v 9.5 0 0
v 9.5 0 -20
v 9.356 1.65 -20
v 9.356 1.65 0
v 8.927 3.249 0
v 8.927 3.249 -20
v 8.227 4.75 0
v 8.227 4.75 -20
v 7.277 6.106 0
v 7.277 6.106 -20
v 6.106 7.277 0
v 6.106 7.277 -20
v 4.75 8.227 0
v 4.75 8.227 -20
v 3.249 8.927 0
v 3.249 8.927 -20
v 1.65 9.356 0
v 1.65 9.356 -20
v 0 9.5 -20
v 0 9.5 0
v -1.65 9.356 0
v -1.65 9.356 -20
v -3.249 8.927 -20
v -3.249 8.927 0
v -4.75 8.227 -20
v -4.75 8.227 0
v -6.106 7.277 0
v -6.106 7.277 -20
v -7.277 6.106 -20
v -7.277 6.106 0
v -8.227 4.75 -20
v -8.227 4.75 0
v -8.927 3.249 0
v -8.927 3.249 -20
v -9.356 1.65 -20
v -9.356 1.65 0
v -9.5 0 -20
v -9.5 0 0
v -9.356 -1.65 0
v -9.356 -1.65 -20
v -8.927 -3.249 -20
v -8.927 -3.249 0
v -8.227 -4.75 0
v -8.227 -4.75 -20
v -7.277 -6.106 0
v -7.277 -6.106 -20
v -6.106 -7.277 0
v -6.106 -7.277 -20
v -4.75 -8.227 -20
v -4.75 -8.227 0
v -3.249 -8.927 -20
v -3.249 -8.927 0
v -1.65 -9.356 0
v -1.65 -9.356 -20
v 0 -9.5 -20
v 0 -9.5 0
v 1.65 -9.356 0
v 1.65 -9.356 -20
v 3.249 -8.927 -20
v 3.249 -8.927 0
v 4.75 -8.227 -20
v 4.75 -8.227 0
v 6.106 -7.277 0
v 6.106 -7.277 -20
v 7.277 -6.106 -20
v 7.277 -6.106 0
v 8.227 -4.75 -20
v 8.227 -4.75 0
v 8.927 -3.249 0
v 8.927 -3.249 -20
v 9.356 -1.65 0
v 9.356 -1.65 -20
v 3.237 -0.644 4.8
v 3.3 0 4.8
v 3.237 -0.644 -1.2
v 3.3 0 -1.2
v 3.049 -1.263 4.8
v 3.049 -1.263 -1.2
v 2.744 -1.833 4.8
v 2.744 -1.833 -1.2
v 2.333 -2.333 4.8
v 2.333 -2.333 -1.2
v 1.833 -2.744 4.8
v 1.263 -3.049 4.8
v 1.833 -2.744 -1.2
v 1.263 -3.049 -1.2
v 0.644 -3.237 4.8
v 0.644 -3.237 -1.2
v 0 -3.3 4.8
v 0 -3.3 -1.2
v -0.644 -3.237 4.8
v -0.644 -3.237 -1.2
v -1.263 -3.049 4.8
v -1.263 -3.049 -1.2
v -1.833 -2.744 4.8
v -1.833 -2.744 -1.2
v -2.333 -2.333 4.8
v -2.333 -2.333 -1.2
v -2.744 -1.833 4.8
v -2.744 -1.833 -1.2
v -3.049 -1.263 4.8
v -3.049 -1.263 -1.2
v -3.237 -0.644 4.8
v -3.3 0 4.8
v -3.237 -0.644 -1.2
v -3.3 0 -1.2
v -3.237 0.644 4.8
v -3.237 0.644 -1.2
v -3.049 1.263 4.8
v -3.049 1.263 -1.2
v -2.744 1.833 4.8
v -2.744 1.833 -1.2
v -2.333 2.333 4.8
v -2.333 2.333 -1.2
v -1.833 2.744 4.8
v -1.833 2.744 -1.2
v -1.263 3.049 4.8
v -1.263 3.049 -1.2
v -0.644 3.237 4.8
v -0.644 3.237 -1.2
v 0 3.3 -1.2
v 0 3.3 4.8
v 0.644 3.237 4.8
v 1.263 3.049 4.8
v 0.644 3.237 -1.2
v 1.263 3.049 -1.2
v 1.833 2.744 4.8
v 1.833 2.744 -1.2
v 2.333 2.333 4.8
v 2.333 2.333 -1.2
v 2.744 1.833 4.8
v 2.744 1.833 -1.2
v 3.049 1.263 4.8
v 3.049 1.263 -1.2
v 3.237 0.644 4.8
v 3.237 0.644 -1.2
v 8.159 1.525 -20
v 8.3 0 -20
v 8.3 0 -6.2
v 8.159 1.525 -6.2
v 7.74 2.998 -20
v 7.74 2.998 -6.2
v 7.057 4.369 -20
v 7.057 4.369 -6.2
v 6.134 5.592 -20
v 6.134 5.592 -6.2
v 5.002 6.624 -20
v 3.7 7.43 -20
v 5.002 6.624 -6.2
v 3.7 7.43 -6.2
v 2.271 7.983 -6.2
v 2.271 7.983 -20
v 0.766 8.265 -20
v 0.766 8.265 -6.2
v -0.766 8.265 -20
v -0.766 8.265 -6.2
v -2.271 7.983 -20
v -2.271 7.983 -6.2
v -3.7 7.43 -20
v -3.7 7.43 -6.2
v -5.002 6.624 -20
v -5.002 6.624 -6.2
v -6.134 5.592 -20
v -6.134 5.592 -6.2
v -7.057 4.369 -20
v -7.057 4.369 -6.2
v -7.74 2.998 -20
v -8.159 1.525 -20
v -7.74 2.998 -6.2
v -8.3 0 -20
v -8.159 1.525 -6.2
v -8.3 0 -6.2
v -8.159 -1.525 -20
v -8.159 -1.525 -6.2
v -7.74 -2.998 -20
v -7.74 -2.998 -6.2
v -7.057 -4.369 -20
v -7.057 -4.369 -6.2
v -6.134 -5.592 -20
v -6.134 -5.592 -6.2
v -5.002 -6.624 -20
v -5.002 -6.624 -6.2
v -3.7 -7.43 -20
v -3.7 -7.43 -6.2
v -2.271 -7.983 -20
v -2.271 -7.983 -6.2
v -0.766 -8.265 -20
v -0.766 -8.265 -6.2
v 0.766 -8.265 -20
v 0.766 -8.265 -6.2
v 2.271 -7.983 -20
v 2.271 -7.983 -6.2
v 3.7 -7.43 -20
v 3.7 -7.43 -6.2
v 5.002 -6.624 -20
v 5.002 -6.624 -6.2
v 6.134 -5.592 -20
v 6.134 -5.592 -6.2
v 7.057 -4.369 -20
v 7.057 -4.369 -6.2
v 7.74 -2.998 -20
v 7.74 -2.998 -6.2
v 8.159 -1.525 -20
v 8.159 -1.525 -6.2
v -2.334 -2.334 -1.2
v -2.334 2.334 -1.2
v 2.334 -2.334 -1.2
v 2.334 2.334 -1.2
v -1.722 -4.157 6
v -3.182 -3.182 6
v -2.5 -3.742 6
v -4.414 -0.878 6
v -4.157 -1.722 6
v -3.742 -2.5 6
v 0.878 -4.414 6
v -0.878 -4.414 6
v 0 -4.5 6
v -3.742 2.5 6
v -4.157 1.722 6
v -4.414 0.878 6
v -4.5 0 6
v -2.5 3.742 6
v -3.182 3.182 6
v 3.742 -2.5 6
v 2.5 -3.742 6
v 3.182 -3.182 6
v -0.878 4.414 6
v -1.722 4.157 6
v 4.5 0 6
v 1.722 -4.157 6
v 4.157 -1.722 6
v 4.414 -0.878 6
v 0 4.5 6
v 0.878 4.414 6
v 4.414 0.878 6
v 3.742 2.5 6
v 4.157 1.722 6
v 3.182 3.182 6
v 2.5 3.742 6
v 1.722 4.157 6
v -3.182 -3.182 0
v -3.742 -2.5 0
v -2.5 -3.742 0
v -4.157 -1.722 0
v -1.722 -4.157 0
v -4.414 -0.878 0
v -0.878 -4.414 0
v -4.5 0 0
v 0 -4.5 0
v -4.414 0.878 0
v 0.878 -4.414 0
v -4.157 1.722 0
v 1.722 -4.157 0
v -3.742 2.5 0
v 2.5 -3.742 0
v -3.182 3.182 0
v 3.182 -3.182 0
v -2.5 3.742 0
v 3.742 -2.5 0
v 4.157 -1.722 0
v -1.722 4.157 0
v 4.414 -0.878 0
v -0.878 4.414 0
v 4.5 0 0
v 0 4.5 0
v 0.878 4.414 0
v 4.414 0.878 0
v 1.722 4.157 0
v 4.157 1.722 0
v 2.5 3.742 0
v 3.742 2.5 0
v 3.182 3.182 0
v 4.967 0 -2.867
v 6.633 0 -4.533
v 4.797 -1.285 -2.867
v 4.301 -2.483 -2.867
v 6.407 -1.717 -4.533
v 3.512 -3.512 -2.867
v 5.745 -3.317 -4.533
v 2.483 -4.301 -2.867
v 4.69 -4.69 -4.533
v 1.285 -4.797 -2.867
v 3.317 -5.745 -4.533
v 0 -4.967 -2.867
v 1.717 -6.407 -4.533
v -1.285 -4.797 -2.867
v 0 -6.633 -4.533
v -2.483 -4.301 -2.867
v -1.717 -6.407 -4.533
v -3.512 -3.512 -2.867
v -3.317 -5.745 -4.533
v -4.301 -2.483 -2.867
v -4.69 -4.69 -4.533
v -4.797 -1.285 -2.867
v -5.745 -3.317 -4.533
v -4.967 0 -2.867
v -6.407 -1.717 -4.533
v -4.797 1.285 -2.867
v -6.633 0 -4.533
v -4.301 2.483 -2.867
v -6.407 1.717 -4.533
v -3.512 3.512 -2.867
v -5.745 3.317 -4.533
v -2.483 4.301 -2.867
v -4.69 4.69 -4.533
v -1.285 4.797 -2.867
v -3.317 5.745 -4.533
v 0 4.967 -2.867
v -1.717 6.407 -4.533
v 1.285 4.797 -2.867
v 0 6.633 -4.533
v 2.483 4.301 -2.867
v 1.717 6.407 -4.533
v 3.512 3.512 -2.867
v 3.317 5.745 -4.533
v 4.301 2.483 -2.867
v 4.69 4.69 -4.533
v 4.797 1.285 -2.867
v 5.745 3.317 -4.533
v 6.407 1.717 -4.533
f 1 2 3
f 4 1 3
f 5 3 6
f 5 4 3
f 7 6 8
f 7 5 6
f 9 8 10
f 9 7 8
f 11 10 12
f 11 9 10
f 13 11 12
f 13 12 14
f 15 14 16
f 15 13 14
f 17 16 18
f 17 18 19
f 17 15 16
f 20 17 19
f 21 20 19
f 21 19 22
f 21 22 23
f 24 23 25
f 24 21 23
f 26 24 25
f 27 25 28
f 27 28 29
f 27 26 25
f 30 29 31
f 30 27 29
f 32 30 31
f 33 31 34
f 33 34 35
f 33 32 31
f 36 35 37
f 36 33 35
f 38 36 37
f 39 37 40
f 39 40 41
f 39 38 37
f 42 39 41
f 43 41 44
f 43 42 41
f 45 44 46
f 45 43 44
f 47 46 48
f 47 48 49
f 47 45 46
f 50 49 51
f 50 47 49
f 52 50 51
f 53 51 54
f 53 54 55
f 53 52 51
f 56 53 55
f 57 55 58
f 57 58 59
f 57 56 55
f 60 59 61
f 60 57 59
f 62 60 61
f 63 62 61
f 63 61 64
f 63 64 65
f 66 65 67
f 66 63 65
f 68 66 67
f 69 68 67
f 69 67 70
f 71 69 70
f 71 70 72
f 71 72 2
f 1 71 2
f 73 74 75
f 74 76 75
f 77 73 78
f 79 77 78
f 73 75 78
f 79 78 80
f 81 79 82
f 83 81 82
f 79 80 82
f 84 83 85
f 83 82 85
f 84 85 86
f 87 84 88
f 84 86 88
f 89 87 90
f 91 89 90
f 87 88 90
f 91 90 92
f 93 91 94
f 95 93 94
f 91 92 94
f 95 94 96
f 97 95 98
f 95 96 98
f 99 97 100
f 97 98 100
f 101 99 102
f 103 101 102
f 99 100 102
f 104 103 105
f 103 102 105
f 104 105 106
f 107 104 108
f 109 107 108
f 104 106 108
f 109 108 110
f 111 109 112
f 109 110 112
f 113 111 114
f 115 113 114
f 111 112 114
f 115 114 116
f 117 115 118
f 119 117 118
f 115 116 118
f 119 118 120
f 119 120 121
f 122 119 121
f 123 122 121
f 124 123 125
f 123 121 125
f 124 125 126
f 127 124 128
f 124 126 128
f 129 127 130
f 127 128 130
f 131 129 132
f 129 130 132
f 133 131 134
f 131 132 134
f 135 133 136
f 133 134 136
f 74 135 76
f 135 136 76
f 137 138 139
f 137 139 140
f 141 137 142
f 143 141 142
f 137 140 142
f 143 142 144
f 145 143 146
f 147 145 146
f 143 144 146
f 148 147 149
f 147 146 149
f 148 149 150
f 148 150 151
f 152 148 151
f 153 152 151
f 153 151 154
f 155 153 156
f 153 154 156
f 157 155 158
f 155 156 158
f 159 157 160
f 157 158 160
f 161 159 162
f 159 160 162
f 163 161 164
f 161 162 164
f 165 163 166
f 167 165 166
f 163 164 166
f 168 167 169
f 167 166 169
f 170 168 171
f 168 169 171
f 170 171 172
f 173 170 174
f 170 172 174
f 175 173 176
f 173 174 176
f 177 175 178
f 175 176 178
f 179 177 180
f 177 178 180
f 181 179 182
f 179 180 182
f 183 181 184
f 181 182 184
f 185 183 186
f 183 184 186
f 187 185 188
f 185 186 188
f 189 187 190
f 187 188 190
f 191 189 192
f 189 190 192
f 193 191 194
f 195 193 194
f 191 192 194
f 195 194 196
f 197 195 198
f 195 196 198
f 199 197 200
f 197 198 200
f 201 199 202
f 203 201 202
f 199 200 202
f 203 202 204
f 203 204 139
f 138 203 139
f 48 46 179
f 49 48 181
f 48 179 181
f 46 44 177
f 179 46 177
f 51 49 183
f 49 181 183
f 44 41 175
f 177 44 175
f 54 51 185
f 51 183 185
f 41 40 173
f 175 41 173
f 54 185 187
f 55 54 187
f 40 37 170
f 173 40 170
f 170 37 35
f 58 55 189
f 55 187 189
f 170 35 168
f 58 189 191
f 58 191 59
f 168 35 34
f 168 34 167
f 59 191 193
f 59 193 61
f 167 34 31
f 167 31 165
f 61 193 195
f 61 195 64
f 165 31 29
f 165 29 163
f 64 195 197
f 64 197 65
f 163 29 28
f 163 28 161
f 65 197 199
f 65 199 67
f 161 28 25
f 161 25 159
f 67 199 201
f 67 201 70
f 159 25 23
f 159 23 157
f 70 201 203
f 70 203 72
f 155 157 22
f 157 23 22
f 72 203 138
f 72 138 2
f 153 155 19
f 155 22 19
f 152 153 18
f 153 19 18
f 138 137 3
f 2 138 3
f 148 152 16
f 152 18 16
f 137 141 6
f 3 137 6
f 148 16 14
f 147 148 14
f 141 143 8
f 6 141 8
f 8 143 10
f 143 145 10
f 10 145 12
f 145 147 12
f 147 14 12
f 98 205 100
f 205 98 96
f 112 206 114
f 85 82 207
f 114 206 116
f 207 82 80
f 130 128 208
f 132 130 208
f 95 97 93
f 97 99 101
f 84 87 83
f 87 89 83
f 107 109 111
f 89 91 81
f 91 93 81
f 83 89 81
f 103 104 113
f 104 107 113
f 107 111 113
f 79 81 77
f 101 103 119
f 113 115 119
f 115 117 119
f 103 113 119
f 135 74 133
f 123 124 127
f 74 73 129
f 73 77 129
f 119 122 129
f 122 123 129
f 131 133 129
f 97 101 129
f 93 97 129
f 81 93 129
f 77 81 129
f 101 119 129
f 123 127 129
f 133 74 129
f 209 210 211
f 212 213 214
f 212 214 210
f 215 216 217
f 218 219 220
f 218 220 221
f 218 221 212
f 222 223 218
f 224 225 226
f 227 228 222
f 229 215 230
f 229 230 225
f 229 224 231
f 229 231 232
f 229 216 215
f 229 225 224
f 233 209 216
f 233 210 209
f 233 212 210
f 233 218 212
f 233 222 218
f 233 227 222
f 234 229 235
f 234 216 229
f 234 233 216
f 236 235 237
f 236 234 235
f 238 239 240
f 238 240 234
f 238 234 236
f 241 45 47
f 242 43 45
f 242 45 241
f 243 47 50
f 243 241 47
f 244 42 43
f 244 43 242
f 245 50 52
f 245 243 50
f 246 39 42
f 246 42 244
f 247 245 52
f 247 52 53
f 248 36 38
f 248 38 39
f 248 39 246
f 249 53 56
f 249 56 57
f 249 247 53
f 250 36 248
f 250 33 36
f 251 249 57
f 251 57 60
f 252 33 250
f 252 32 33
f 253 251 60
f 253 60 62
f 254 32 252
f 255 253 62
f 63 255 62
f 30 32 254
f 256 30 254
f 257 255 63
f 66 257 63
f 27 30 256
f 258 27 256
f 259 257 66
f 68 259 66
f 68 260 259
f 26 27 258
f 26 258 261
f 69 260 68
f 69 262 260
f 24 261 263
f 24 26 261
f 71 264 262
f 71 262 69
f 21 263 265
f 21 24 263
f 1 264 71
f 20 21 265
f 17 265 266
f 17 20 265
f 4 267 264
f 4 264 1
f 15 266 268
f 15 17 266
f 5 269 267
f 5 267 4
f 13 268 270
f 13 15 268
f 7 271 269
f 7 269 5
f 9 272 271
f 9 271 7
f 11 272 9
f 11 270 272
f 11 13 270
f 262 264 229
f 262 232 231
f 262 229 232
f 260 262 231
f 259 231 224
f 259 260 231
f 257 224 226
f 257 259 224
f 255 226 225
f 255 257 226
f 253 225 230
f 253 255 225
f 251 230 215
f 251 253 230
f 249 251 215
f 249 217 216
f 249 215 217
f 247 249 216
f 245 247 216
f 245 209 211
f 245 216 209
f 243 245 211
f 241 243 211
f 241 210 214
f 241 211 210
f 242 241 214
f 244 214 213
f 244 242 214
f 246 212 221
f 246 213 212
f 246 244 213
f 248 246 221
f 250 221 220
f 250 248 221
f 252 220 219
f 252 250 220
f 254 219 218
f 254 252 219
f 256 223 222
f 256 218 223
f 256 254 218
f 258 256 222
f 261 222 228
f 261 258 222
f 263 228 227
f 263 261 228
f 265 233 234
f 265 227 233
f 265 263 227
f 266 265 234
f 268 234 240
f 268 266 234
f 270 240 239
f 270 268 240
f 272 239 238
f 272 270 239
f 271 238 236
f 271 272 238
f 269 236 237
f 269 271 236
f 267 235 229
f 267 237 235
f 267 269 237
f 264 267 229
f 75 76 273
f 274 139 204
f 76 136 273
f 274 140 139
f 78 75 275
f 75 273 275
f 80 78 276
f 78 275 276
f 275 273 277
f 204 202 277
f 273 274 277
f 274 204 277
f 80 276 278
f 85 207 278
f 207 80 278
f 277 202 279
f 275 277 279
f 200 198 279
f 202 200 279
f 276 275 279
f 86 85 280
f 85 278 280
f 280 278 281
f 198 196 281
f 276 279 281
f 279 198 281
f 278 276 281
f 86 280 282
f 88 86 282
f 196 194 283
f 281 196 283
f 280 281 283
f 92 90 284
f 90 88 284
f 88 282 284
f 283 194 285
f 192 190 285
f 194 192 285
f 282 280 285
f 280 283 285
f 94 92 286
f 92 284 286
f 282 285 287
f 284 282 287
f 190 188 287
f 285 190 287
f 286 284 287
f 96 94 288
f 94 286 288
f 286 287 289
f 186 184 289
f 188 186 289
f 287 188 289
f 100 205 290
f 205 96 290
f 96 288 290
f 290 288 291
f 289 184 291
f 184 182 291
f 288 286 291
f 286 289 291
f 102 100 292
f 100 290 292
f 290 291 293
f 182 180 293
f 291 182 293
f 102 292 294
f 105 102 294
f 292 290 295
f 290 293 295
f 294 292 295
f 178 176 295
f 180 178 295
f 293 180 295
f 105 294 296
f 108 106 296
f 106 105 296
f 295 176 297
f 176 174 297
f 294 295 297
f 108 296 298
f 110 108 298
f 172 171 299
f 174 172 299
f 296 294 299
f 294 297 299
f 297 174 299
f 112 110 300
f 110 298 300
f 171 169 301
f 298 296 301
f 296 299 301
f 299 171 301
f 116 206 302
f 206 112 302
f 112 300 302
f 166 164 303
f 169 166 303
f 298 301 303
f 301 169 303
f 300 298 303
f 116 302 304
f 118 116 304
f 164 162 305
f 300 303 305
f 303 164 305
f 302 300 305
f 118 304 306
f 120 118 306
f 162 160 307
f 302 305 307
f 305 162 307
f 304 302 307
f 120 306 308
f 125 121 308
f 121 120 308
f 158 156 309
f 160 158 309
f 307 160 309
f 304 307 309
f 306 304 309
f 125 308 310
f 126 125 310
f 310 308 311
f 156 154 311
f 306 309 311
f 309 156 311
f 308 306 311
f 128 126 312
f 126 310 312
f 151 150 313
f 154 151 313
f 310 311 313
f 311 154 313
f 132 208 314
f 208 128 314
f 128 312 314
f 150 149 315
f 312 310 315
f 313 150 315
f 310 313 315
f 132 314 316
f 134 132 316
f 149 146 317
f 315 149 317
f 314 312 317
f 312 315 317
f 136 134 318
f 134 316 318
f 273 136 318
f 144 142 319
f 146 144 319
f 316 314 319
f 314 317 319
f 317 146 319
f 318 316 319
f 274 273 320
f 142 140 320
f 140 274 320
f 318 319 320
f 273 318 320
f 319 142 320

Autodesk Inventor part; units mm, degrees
ref_plane "YZ Plane" through (0, 0, 0) normal (1, 0, 0) x (0, 1, 0)
ref_plane "XZ Plane" through (0, 0, 0) normal (0, 1, 0) x (-1, 0, 0)
ref_plane "XY Plane" through (0, 0, 0) normal (0, 0, 1) x (1, 0, 0)
sketch "Sketch1" plane through (0, 0, 0) normal (0, 0, 1) x (1, 0, 0)
  circle A0 centre (0, 0) radius 4.5
  circle A1 centre (0, 0) radius 9.5
  dimension "d0" = 9
  dimension "d1" = 19
extrude "Extrusion1" add sketch "Sketch1" against normal blind 20 contours A0 | A1
extrude "Extrusion2" add sketch "Sketch1" along normal blind 6 contours A0
shell "Shell1" thickness 1.2 removed faces 1 at (2.3703, -2.0999, -20)
chamfer "Chamfer1" distance 5 angle 45 1 edges at (-8.3, 0, -1.2)
properties part number "Marker Plunger" material "ABS Plastic"
